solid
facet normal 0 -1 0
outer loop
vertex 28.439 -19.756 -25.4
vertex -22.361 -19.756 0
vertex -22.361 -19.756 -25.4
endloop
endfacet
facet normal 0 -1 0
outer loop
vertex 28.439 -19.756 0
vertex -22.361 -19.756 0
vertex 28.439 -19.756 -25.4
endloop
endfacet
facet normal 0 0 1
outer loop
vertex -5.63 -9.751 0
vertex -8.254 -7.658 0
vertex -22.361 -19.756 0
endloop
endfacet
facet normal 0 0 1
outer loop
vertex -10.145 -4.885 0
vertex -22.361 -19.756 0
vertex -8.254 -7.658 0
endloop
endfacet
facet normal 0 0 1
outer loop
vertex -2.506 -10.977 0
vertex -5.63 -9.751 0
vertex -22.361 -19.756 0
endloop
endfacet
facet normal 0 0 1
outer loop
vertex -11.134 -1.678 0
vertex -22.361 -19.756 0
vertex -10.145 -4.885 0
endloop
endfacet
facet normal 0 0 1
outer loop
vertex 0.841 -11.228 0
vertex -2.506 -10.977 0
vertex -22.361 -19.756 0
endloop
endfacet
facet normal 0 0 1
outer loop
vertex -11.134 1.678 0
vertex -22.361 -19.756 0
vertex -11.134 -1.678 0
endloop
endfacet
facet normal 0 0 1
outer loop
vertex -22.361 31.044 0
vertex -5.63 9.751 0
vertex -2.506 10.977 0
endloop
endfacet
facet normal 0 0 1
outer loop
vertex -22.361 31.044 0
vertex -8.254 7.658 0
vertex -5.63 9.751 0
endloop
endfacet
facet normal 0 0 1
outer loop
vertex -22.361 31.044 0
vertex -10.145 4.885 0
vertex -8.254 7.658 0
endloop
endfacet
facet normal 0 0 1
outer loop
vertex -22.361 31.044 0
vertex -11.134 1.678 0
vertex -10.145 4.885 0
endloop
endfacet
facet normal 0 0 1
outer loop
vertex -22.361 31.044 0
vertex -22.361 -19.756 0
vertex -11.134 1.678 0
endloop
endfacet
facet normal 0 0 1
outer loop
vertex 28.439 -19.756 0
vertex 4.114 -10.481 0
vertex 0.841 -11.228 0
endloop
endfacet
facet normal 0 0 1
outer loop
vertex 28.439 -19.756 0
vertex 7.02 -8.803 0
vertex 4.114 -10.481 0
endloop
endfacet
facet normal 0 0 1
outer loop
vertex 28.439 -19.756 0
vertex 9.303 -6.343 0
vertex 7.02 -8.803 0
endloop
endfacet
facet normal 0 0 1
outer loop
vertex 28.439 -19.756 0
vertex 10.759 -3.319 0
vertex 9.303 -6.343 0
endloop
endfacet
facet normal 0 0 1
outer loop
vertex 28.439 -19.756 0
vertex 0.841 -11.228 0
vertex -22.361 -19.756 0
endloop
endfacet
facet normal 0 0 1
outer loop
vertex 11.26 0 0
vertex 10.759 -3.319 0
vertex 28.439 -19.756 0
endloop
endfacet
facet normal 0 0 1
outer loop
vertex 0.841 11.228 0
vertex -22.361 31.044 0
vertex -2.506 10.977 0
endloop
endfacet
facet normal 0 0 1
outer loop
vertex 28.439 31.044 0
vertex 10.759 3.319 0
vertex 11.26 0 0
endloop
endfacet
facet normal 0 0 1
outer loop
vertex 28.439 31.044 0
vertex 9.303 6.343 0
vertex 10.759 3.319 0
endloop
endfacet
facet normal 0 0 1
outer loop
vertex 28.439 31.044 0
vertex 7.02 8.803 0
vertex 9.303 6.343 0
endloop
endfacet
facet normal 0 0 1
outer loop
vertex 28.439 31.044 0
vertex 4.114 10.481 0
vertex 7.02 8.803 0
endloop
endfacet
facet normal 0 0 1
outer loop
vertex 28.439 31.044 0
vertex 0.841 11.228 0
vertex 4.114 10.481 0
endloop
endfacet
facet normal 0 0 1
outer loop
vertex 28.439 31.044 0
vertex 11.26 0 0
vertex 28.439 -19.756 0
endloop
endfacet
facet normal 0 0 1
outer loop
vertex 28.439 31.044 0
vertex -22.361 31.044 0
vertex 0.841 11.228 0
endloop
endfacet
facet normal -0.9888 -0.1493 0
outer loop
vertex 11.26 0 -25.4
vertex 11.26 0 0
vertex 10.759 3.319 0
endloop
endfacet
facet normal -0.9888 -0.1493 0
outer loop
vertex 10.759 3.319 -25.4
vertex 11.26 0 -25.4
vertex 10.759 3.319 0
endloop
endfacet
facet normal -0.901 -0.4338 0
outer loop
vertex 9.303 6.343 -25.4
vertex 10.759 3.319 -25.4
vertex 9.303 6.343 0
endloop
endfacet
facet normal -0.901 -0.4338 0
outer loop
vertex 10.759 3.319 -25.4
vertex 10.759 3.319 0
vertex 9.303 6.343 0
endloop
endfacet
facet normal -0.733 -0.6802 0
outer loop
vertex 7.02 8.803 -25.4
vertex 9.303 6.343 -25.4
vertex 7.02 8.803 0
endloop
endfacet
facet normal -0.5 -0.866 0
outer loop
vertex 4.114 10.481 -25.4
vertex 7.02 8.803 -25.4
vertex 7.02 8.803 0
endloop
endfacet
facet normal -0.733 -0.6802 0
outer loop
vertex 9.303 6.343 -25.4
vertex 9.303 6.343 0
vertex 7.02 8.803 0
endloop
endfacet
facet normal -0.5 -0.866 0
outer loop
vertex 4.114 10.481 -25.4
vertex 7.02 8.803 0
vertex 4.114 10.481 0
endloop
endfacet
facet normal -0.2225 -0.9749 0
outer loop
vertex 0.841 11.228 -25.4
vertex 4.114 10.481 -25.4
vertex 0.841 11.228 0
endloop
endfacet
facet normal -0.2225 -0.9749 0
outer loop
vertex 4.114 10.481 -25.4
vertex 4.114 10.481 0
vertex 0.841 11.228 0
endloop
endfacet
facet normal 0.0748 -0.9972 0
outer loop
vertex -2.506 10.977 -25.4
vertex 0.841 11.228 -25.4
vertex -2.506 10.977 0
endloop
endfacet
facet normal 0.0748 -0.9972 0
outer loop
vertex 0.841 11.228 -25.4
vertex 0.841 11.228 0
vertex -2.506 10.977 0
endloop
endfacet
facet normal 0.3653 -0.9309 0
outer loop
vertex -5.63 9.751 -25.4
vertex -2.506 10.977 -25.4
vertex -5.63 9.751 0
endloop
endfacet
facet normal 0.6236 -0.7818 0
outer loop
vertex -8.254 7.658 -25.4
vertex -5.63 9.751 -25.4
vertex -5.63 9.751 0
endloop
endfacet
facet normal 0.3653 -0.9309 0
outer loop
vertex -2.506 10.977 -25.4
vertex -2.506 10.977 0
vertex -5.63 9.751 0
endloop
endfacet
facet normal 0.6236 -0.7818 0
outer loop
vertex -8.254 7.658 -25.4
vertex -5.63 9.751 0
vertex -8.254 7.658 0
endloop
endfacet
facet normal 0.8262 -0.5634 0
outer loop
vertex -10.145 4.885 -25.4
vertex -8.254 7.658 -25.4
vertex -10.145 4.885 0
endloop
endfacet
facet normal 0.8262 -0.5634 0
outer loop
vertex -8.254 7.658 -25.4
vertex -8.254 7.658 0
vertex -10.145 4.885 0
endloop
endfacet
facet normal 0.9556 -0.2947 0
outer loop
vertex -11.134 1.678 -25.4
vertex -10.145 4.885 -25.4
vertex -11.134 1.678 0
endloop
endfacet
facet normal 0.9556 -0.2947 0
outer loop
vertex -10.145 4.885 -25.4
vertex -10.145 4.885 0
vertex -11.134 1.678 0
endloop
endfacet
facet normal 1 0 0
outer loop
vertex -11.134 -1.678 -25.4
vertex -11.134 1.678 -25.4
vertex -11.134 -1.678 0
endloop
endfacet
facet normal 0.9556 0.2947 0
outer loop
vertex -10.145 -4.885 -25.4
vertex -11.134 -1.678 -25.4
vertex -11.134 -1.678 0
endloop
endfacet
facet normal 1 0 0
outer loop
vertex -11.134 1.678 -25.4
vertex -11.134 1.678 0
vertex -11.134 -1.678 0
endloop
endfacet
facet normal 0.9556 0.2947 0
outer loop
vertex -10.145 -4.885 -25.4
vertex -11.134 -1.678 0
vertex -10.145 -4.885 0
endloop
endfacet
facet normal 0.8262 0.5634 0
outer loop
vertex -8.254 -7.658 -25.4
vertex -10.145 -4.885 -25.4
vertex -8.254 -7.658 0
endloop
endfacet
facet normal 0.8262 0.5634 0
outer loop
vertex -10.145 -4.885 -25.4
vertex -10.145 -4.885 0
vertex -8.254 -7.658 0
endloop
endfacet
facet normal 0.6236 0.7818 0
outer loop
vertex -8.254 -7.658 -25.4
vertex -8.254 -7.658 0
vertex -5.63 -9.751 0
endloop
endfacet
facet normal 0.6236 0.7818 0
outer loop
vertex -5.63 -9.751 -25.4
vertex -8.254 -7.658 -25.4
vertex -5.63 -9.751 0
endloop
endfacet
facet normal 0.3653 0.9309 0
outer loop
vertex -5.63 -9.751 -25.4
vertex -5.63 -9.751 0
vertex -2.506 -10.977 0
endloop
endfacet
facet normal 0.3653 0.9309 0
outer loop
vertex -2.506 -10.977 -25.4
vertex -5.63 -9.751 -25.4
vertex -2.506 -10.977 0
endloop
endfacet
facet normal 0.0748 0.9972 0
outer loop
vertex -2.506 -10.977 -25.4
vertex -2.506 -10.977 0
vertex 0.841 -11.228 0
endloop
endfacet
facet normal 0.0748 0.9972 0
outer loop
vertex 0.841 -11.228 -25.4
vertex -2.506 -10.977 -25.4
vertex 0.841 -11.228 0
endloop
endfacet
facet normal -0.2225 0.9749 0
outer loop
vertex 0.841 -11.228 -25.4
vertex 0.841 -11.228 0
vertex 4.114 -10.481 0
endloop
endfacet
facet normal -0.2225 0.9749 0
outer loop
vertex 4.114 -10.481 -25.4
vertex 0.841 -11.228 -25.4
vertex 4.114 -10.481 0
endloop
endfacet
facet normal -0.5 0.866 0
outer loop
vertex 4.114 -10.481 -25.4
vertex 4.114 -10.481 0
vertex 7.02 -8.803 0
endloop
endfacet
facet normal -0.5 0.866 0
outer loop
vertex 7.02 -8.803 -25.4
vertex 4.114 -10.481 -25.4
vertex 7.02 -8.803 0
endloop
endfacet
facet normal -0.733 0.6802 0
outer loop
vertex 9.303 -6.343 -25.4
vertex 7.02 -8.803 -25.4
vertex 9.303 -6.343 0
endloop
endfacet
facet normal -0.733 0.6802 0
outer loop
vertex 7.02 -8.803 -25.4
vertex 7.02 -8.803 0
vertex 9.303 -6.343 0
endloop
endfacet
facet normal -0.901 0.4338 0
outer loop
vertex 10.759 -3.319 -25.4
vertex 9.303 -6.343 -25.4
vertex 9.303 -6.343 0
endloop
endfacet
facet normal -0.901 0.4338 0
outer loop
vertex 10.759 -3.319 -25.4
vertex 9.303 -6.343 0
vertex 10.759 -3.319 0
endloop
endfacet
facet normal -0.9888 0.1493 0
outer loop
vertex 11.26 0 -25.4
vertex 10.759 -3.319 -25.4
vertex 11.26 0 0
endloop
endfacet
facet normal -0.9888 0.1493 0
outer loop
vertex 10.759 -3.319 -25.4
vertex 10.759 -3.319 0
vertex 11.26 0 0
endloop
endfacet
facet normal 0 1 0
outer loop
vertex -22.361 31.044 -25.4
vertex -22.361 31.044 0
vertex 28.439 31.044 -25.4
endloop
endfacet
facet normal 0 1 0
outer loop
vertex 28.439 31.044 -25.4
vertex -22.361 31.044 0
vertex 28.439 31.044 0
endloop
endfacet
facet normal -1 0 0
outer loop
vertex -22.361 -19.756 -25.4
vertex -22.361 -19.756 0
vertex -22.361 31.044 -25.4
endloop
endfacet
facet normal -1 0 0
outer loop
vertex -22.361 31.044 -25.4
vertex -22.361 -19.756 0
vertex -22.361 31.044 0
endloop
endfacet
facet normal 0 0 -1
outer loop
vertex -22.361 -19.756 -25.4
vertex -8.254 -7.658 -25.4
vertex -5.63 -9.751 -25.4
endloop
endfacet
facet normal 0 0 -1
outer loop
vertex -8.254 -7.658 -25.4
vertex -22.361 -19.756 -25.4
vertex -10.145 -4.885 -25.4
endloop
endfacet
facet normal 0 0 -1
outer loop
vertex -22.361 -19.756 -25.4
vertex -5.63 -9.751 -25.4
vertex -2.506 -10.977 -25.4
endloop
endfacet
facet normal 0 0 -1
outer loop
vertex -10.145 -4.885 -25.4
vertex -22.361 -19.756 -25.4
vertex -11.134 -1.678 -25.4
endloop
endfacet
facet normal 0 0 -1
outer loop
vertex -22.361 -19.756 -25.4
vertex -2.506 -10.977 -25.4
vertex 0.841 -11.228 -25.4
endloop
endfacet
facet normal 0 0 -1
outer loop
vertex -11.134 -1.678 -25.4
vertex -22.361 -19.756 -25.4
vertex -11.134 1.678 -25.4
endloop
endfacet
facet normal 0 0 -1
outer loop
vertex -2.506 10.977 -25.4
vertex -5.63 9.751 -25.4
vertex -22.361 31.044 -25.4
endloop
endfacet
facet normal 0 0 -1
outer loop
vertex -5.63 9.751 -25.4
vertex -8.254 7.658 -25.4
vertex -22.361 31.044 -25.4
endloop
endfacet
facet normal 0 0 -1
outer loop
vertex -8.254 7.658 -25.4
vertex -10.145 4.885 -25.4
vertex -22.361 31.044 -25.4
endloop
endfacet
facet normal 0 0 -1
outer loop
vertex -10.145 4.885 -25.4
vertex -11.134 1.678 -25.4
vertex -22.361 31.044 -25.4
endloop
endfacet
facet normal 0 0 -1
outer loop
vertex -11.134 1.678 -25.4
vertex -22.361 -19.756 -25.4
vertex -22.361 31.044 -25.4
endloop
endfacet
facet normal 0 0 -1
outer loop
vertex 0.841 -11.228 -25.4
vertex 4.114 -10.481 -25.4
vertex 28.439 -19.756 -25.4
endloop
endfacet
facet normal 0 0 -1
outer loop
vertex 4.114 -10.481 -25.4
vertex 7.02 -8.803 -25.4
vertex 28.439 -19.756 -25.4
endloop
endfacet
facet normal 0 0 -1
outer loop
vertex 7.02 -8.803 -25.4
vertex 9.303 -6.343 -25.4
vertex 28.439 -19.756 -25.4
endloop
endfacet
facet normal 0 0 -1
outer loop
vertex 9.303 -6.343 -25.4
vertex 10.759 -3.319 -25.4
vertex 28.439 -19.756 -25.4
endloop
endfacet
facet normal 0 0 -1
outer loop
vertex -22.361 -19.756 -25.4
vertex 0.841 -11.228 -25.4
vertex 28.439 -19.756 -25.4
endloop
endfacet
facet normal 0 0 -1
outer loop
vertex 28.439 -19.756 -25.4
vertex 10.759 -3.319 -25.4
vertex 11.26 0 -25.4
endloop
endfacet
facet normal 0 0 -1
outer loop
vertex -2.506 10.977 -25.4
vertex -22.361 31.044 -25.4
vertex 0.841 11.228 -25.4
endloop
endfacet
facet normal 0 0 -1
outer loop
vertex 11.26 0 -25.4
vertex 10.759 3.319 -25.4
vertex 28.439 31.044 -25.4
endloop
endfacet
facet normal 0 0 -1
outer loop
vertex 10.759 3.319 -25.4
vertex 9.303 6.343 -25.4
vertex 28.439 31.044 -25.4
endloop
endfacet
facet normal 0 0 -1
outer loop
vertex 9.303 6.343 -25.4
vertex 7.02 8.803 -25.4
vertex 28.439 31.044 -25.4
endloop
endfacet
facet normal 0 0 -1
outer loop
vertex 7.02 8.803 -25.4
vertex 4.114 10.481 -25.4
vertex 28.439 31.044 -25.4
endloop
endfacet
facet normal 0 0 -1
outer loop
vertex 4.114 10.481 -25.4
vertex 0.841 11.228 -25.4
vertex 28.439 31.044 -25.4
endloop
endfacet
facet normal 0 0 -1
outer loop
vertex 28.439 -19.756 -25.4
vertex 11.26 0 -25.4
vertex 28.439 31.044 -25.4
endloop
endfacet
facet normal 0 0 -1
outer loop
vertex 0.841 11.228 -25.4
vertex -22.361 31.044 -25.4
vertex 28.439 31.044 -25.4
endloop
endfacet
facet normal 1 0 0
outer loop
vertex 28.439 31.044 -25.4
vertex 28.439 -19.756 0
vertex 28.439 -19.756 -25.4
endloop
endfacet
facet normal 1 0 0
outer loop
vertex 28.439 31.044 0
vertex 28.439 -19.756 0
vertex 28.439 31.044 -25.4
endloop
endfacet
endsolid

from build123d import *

# Parameters (mm, degrees)
F0_W     = 50.8
F0_H     = 50.8
F0_R     = 11.259626
F1_DEPTH = 25.4


with BuildPart() as f1:
    # F0 (on Top) → F1 (new body)
    with BuildSketch(Plane.XY):
        with Locations((3.039317, 5.644446)):
            Rectangle(F0_W, F0_H)
        Circle(F0_R, mode=Mode.SUBTRACT)
    extrude(amount=-F1_DEPTH)


solid = f1.part
